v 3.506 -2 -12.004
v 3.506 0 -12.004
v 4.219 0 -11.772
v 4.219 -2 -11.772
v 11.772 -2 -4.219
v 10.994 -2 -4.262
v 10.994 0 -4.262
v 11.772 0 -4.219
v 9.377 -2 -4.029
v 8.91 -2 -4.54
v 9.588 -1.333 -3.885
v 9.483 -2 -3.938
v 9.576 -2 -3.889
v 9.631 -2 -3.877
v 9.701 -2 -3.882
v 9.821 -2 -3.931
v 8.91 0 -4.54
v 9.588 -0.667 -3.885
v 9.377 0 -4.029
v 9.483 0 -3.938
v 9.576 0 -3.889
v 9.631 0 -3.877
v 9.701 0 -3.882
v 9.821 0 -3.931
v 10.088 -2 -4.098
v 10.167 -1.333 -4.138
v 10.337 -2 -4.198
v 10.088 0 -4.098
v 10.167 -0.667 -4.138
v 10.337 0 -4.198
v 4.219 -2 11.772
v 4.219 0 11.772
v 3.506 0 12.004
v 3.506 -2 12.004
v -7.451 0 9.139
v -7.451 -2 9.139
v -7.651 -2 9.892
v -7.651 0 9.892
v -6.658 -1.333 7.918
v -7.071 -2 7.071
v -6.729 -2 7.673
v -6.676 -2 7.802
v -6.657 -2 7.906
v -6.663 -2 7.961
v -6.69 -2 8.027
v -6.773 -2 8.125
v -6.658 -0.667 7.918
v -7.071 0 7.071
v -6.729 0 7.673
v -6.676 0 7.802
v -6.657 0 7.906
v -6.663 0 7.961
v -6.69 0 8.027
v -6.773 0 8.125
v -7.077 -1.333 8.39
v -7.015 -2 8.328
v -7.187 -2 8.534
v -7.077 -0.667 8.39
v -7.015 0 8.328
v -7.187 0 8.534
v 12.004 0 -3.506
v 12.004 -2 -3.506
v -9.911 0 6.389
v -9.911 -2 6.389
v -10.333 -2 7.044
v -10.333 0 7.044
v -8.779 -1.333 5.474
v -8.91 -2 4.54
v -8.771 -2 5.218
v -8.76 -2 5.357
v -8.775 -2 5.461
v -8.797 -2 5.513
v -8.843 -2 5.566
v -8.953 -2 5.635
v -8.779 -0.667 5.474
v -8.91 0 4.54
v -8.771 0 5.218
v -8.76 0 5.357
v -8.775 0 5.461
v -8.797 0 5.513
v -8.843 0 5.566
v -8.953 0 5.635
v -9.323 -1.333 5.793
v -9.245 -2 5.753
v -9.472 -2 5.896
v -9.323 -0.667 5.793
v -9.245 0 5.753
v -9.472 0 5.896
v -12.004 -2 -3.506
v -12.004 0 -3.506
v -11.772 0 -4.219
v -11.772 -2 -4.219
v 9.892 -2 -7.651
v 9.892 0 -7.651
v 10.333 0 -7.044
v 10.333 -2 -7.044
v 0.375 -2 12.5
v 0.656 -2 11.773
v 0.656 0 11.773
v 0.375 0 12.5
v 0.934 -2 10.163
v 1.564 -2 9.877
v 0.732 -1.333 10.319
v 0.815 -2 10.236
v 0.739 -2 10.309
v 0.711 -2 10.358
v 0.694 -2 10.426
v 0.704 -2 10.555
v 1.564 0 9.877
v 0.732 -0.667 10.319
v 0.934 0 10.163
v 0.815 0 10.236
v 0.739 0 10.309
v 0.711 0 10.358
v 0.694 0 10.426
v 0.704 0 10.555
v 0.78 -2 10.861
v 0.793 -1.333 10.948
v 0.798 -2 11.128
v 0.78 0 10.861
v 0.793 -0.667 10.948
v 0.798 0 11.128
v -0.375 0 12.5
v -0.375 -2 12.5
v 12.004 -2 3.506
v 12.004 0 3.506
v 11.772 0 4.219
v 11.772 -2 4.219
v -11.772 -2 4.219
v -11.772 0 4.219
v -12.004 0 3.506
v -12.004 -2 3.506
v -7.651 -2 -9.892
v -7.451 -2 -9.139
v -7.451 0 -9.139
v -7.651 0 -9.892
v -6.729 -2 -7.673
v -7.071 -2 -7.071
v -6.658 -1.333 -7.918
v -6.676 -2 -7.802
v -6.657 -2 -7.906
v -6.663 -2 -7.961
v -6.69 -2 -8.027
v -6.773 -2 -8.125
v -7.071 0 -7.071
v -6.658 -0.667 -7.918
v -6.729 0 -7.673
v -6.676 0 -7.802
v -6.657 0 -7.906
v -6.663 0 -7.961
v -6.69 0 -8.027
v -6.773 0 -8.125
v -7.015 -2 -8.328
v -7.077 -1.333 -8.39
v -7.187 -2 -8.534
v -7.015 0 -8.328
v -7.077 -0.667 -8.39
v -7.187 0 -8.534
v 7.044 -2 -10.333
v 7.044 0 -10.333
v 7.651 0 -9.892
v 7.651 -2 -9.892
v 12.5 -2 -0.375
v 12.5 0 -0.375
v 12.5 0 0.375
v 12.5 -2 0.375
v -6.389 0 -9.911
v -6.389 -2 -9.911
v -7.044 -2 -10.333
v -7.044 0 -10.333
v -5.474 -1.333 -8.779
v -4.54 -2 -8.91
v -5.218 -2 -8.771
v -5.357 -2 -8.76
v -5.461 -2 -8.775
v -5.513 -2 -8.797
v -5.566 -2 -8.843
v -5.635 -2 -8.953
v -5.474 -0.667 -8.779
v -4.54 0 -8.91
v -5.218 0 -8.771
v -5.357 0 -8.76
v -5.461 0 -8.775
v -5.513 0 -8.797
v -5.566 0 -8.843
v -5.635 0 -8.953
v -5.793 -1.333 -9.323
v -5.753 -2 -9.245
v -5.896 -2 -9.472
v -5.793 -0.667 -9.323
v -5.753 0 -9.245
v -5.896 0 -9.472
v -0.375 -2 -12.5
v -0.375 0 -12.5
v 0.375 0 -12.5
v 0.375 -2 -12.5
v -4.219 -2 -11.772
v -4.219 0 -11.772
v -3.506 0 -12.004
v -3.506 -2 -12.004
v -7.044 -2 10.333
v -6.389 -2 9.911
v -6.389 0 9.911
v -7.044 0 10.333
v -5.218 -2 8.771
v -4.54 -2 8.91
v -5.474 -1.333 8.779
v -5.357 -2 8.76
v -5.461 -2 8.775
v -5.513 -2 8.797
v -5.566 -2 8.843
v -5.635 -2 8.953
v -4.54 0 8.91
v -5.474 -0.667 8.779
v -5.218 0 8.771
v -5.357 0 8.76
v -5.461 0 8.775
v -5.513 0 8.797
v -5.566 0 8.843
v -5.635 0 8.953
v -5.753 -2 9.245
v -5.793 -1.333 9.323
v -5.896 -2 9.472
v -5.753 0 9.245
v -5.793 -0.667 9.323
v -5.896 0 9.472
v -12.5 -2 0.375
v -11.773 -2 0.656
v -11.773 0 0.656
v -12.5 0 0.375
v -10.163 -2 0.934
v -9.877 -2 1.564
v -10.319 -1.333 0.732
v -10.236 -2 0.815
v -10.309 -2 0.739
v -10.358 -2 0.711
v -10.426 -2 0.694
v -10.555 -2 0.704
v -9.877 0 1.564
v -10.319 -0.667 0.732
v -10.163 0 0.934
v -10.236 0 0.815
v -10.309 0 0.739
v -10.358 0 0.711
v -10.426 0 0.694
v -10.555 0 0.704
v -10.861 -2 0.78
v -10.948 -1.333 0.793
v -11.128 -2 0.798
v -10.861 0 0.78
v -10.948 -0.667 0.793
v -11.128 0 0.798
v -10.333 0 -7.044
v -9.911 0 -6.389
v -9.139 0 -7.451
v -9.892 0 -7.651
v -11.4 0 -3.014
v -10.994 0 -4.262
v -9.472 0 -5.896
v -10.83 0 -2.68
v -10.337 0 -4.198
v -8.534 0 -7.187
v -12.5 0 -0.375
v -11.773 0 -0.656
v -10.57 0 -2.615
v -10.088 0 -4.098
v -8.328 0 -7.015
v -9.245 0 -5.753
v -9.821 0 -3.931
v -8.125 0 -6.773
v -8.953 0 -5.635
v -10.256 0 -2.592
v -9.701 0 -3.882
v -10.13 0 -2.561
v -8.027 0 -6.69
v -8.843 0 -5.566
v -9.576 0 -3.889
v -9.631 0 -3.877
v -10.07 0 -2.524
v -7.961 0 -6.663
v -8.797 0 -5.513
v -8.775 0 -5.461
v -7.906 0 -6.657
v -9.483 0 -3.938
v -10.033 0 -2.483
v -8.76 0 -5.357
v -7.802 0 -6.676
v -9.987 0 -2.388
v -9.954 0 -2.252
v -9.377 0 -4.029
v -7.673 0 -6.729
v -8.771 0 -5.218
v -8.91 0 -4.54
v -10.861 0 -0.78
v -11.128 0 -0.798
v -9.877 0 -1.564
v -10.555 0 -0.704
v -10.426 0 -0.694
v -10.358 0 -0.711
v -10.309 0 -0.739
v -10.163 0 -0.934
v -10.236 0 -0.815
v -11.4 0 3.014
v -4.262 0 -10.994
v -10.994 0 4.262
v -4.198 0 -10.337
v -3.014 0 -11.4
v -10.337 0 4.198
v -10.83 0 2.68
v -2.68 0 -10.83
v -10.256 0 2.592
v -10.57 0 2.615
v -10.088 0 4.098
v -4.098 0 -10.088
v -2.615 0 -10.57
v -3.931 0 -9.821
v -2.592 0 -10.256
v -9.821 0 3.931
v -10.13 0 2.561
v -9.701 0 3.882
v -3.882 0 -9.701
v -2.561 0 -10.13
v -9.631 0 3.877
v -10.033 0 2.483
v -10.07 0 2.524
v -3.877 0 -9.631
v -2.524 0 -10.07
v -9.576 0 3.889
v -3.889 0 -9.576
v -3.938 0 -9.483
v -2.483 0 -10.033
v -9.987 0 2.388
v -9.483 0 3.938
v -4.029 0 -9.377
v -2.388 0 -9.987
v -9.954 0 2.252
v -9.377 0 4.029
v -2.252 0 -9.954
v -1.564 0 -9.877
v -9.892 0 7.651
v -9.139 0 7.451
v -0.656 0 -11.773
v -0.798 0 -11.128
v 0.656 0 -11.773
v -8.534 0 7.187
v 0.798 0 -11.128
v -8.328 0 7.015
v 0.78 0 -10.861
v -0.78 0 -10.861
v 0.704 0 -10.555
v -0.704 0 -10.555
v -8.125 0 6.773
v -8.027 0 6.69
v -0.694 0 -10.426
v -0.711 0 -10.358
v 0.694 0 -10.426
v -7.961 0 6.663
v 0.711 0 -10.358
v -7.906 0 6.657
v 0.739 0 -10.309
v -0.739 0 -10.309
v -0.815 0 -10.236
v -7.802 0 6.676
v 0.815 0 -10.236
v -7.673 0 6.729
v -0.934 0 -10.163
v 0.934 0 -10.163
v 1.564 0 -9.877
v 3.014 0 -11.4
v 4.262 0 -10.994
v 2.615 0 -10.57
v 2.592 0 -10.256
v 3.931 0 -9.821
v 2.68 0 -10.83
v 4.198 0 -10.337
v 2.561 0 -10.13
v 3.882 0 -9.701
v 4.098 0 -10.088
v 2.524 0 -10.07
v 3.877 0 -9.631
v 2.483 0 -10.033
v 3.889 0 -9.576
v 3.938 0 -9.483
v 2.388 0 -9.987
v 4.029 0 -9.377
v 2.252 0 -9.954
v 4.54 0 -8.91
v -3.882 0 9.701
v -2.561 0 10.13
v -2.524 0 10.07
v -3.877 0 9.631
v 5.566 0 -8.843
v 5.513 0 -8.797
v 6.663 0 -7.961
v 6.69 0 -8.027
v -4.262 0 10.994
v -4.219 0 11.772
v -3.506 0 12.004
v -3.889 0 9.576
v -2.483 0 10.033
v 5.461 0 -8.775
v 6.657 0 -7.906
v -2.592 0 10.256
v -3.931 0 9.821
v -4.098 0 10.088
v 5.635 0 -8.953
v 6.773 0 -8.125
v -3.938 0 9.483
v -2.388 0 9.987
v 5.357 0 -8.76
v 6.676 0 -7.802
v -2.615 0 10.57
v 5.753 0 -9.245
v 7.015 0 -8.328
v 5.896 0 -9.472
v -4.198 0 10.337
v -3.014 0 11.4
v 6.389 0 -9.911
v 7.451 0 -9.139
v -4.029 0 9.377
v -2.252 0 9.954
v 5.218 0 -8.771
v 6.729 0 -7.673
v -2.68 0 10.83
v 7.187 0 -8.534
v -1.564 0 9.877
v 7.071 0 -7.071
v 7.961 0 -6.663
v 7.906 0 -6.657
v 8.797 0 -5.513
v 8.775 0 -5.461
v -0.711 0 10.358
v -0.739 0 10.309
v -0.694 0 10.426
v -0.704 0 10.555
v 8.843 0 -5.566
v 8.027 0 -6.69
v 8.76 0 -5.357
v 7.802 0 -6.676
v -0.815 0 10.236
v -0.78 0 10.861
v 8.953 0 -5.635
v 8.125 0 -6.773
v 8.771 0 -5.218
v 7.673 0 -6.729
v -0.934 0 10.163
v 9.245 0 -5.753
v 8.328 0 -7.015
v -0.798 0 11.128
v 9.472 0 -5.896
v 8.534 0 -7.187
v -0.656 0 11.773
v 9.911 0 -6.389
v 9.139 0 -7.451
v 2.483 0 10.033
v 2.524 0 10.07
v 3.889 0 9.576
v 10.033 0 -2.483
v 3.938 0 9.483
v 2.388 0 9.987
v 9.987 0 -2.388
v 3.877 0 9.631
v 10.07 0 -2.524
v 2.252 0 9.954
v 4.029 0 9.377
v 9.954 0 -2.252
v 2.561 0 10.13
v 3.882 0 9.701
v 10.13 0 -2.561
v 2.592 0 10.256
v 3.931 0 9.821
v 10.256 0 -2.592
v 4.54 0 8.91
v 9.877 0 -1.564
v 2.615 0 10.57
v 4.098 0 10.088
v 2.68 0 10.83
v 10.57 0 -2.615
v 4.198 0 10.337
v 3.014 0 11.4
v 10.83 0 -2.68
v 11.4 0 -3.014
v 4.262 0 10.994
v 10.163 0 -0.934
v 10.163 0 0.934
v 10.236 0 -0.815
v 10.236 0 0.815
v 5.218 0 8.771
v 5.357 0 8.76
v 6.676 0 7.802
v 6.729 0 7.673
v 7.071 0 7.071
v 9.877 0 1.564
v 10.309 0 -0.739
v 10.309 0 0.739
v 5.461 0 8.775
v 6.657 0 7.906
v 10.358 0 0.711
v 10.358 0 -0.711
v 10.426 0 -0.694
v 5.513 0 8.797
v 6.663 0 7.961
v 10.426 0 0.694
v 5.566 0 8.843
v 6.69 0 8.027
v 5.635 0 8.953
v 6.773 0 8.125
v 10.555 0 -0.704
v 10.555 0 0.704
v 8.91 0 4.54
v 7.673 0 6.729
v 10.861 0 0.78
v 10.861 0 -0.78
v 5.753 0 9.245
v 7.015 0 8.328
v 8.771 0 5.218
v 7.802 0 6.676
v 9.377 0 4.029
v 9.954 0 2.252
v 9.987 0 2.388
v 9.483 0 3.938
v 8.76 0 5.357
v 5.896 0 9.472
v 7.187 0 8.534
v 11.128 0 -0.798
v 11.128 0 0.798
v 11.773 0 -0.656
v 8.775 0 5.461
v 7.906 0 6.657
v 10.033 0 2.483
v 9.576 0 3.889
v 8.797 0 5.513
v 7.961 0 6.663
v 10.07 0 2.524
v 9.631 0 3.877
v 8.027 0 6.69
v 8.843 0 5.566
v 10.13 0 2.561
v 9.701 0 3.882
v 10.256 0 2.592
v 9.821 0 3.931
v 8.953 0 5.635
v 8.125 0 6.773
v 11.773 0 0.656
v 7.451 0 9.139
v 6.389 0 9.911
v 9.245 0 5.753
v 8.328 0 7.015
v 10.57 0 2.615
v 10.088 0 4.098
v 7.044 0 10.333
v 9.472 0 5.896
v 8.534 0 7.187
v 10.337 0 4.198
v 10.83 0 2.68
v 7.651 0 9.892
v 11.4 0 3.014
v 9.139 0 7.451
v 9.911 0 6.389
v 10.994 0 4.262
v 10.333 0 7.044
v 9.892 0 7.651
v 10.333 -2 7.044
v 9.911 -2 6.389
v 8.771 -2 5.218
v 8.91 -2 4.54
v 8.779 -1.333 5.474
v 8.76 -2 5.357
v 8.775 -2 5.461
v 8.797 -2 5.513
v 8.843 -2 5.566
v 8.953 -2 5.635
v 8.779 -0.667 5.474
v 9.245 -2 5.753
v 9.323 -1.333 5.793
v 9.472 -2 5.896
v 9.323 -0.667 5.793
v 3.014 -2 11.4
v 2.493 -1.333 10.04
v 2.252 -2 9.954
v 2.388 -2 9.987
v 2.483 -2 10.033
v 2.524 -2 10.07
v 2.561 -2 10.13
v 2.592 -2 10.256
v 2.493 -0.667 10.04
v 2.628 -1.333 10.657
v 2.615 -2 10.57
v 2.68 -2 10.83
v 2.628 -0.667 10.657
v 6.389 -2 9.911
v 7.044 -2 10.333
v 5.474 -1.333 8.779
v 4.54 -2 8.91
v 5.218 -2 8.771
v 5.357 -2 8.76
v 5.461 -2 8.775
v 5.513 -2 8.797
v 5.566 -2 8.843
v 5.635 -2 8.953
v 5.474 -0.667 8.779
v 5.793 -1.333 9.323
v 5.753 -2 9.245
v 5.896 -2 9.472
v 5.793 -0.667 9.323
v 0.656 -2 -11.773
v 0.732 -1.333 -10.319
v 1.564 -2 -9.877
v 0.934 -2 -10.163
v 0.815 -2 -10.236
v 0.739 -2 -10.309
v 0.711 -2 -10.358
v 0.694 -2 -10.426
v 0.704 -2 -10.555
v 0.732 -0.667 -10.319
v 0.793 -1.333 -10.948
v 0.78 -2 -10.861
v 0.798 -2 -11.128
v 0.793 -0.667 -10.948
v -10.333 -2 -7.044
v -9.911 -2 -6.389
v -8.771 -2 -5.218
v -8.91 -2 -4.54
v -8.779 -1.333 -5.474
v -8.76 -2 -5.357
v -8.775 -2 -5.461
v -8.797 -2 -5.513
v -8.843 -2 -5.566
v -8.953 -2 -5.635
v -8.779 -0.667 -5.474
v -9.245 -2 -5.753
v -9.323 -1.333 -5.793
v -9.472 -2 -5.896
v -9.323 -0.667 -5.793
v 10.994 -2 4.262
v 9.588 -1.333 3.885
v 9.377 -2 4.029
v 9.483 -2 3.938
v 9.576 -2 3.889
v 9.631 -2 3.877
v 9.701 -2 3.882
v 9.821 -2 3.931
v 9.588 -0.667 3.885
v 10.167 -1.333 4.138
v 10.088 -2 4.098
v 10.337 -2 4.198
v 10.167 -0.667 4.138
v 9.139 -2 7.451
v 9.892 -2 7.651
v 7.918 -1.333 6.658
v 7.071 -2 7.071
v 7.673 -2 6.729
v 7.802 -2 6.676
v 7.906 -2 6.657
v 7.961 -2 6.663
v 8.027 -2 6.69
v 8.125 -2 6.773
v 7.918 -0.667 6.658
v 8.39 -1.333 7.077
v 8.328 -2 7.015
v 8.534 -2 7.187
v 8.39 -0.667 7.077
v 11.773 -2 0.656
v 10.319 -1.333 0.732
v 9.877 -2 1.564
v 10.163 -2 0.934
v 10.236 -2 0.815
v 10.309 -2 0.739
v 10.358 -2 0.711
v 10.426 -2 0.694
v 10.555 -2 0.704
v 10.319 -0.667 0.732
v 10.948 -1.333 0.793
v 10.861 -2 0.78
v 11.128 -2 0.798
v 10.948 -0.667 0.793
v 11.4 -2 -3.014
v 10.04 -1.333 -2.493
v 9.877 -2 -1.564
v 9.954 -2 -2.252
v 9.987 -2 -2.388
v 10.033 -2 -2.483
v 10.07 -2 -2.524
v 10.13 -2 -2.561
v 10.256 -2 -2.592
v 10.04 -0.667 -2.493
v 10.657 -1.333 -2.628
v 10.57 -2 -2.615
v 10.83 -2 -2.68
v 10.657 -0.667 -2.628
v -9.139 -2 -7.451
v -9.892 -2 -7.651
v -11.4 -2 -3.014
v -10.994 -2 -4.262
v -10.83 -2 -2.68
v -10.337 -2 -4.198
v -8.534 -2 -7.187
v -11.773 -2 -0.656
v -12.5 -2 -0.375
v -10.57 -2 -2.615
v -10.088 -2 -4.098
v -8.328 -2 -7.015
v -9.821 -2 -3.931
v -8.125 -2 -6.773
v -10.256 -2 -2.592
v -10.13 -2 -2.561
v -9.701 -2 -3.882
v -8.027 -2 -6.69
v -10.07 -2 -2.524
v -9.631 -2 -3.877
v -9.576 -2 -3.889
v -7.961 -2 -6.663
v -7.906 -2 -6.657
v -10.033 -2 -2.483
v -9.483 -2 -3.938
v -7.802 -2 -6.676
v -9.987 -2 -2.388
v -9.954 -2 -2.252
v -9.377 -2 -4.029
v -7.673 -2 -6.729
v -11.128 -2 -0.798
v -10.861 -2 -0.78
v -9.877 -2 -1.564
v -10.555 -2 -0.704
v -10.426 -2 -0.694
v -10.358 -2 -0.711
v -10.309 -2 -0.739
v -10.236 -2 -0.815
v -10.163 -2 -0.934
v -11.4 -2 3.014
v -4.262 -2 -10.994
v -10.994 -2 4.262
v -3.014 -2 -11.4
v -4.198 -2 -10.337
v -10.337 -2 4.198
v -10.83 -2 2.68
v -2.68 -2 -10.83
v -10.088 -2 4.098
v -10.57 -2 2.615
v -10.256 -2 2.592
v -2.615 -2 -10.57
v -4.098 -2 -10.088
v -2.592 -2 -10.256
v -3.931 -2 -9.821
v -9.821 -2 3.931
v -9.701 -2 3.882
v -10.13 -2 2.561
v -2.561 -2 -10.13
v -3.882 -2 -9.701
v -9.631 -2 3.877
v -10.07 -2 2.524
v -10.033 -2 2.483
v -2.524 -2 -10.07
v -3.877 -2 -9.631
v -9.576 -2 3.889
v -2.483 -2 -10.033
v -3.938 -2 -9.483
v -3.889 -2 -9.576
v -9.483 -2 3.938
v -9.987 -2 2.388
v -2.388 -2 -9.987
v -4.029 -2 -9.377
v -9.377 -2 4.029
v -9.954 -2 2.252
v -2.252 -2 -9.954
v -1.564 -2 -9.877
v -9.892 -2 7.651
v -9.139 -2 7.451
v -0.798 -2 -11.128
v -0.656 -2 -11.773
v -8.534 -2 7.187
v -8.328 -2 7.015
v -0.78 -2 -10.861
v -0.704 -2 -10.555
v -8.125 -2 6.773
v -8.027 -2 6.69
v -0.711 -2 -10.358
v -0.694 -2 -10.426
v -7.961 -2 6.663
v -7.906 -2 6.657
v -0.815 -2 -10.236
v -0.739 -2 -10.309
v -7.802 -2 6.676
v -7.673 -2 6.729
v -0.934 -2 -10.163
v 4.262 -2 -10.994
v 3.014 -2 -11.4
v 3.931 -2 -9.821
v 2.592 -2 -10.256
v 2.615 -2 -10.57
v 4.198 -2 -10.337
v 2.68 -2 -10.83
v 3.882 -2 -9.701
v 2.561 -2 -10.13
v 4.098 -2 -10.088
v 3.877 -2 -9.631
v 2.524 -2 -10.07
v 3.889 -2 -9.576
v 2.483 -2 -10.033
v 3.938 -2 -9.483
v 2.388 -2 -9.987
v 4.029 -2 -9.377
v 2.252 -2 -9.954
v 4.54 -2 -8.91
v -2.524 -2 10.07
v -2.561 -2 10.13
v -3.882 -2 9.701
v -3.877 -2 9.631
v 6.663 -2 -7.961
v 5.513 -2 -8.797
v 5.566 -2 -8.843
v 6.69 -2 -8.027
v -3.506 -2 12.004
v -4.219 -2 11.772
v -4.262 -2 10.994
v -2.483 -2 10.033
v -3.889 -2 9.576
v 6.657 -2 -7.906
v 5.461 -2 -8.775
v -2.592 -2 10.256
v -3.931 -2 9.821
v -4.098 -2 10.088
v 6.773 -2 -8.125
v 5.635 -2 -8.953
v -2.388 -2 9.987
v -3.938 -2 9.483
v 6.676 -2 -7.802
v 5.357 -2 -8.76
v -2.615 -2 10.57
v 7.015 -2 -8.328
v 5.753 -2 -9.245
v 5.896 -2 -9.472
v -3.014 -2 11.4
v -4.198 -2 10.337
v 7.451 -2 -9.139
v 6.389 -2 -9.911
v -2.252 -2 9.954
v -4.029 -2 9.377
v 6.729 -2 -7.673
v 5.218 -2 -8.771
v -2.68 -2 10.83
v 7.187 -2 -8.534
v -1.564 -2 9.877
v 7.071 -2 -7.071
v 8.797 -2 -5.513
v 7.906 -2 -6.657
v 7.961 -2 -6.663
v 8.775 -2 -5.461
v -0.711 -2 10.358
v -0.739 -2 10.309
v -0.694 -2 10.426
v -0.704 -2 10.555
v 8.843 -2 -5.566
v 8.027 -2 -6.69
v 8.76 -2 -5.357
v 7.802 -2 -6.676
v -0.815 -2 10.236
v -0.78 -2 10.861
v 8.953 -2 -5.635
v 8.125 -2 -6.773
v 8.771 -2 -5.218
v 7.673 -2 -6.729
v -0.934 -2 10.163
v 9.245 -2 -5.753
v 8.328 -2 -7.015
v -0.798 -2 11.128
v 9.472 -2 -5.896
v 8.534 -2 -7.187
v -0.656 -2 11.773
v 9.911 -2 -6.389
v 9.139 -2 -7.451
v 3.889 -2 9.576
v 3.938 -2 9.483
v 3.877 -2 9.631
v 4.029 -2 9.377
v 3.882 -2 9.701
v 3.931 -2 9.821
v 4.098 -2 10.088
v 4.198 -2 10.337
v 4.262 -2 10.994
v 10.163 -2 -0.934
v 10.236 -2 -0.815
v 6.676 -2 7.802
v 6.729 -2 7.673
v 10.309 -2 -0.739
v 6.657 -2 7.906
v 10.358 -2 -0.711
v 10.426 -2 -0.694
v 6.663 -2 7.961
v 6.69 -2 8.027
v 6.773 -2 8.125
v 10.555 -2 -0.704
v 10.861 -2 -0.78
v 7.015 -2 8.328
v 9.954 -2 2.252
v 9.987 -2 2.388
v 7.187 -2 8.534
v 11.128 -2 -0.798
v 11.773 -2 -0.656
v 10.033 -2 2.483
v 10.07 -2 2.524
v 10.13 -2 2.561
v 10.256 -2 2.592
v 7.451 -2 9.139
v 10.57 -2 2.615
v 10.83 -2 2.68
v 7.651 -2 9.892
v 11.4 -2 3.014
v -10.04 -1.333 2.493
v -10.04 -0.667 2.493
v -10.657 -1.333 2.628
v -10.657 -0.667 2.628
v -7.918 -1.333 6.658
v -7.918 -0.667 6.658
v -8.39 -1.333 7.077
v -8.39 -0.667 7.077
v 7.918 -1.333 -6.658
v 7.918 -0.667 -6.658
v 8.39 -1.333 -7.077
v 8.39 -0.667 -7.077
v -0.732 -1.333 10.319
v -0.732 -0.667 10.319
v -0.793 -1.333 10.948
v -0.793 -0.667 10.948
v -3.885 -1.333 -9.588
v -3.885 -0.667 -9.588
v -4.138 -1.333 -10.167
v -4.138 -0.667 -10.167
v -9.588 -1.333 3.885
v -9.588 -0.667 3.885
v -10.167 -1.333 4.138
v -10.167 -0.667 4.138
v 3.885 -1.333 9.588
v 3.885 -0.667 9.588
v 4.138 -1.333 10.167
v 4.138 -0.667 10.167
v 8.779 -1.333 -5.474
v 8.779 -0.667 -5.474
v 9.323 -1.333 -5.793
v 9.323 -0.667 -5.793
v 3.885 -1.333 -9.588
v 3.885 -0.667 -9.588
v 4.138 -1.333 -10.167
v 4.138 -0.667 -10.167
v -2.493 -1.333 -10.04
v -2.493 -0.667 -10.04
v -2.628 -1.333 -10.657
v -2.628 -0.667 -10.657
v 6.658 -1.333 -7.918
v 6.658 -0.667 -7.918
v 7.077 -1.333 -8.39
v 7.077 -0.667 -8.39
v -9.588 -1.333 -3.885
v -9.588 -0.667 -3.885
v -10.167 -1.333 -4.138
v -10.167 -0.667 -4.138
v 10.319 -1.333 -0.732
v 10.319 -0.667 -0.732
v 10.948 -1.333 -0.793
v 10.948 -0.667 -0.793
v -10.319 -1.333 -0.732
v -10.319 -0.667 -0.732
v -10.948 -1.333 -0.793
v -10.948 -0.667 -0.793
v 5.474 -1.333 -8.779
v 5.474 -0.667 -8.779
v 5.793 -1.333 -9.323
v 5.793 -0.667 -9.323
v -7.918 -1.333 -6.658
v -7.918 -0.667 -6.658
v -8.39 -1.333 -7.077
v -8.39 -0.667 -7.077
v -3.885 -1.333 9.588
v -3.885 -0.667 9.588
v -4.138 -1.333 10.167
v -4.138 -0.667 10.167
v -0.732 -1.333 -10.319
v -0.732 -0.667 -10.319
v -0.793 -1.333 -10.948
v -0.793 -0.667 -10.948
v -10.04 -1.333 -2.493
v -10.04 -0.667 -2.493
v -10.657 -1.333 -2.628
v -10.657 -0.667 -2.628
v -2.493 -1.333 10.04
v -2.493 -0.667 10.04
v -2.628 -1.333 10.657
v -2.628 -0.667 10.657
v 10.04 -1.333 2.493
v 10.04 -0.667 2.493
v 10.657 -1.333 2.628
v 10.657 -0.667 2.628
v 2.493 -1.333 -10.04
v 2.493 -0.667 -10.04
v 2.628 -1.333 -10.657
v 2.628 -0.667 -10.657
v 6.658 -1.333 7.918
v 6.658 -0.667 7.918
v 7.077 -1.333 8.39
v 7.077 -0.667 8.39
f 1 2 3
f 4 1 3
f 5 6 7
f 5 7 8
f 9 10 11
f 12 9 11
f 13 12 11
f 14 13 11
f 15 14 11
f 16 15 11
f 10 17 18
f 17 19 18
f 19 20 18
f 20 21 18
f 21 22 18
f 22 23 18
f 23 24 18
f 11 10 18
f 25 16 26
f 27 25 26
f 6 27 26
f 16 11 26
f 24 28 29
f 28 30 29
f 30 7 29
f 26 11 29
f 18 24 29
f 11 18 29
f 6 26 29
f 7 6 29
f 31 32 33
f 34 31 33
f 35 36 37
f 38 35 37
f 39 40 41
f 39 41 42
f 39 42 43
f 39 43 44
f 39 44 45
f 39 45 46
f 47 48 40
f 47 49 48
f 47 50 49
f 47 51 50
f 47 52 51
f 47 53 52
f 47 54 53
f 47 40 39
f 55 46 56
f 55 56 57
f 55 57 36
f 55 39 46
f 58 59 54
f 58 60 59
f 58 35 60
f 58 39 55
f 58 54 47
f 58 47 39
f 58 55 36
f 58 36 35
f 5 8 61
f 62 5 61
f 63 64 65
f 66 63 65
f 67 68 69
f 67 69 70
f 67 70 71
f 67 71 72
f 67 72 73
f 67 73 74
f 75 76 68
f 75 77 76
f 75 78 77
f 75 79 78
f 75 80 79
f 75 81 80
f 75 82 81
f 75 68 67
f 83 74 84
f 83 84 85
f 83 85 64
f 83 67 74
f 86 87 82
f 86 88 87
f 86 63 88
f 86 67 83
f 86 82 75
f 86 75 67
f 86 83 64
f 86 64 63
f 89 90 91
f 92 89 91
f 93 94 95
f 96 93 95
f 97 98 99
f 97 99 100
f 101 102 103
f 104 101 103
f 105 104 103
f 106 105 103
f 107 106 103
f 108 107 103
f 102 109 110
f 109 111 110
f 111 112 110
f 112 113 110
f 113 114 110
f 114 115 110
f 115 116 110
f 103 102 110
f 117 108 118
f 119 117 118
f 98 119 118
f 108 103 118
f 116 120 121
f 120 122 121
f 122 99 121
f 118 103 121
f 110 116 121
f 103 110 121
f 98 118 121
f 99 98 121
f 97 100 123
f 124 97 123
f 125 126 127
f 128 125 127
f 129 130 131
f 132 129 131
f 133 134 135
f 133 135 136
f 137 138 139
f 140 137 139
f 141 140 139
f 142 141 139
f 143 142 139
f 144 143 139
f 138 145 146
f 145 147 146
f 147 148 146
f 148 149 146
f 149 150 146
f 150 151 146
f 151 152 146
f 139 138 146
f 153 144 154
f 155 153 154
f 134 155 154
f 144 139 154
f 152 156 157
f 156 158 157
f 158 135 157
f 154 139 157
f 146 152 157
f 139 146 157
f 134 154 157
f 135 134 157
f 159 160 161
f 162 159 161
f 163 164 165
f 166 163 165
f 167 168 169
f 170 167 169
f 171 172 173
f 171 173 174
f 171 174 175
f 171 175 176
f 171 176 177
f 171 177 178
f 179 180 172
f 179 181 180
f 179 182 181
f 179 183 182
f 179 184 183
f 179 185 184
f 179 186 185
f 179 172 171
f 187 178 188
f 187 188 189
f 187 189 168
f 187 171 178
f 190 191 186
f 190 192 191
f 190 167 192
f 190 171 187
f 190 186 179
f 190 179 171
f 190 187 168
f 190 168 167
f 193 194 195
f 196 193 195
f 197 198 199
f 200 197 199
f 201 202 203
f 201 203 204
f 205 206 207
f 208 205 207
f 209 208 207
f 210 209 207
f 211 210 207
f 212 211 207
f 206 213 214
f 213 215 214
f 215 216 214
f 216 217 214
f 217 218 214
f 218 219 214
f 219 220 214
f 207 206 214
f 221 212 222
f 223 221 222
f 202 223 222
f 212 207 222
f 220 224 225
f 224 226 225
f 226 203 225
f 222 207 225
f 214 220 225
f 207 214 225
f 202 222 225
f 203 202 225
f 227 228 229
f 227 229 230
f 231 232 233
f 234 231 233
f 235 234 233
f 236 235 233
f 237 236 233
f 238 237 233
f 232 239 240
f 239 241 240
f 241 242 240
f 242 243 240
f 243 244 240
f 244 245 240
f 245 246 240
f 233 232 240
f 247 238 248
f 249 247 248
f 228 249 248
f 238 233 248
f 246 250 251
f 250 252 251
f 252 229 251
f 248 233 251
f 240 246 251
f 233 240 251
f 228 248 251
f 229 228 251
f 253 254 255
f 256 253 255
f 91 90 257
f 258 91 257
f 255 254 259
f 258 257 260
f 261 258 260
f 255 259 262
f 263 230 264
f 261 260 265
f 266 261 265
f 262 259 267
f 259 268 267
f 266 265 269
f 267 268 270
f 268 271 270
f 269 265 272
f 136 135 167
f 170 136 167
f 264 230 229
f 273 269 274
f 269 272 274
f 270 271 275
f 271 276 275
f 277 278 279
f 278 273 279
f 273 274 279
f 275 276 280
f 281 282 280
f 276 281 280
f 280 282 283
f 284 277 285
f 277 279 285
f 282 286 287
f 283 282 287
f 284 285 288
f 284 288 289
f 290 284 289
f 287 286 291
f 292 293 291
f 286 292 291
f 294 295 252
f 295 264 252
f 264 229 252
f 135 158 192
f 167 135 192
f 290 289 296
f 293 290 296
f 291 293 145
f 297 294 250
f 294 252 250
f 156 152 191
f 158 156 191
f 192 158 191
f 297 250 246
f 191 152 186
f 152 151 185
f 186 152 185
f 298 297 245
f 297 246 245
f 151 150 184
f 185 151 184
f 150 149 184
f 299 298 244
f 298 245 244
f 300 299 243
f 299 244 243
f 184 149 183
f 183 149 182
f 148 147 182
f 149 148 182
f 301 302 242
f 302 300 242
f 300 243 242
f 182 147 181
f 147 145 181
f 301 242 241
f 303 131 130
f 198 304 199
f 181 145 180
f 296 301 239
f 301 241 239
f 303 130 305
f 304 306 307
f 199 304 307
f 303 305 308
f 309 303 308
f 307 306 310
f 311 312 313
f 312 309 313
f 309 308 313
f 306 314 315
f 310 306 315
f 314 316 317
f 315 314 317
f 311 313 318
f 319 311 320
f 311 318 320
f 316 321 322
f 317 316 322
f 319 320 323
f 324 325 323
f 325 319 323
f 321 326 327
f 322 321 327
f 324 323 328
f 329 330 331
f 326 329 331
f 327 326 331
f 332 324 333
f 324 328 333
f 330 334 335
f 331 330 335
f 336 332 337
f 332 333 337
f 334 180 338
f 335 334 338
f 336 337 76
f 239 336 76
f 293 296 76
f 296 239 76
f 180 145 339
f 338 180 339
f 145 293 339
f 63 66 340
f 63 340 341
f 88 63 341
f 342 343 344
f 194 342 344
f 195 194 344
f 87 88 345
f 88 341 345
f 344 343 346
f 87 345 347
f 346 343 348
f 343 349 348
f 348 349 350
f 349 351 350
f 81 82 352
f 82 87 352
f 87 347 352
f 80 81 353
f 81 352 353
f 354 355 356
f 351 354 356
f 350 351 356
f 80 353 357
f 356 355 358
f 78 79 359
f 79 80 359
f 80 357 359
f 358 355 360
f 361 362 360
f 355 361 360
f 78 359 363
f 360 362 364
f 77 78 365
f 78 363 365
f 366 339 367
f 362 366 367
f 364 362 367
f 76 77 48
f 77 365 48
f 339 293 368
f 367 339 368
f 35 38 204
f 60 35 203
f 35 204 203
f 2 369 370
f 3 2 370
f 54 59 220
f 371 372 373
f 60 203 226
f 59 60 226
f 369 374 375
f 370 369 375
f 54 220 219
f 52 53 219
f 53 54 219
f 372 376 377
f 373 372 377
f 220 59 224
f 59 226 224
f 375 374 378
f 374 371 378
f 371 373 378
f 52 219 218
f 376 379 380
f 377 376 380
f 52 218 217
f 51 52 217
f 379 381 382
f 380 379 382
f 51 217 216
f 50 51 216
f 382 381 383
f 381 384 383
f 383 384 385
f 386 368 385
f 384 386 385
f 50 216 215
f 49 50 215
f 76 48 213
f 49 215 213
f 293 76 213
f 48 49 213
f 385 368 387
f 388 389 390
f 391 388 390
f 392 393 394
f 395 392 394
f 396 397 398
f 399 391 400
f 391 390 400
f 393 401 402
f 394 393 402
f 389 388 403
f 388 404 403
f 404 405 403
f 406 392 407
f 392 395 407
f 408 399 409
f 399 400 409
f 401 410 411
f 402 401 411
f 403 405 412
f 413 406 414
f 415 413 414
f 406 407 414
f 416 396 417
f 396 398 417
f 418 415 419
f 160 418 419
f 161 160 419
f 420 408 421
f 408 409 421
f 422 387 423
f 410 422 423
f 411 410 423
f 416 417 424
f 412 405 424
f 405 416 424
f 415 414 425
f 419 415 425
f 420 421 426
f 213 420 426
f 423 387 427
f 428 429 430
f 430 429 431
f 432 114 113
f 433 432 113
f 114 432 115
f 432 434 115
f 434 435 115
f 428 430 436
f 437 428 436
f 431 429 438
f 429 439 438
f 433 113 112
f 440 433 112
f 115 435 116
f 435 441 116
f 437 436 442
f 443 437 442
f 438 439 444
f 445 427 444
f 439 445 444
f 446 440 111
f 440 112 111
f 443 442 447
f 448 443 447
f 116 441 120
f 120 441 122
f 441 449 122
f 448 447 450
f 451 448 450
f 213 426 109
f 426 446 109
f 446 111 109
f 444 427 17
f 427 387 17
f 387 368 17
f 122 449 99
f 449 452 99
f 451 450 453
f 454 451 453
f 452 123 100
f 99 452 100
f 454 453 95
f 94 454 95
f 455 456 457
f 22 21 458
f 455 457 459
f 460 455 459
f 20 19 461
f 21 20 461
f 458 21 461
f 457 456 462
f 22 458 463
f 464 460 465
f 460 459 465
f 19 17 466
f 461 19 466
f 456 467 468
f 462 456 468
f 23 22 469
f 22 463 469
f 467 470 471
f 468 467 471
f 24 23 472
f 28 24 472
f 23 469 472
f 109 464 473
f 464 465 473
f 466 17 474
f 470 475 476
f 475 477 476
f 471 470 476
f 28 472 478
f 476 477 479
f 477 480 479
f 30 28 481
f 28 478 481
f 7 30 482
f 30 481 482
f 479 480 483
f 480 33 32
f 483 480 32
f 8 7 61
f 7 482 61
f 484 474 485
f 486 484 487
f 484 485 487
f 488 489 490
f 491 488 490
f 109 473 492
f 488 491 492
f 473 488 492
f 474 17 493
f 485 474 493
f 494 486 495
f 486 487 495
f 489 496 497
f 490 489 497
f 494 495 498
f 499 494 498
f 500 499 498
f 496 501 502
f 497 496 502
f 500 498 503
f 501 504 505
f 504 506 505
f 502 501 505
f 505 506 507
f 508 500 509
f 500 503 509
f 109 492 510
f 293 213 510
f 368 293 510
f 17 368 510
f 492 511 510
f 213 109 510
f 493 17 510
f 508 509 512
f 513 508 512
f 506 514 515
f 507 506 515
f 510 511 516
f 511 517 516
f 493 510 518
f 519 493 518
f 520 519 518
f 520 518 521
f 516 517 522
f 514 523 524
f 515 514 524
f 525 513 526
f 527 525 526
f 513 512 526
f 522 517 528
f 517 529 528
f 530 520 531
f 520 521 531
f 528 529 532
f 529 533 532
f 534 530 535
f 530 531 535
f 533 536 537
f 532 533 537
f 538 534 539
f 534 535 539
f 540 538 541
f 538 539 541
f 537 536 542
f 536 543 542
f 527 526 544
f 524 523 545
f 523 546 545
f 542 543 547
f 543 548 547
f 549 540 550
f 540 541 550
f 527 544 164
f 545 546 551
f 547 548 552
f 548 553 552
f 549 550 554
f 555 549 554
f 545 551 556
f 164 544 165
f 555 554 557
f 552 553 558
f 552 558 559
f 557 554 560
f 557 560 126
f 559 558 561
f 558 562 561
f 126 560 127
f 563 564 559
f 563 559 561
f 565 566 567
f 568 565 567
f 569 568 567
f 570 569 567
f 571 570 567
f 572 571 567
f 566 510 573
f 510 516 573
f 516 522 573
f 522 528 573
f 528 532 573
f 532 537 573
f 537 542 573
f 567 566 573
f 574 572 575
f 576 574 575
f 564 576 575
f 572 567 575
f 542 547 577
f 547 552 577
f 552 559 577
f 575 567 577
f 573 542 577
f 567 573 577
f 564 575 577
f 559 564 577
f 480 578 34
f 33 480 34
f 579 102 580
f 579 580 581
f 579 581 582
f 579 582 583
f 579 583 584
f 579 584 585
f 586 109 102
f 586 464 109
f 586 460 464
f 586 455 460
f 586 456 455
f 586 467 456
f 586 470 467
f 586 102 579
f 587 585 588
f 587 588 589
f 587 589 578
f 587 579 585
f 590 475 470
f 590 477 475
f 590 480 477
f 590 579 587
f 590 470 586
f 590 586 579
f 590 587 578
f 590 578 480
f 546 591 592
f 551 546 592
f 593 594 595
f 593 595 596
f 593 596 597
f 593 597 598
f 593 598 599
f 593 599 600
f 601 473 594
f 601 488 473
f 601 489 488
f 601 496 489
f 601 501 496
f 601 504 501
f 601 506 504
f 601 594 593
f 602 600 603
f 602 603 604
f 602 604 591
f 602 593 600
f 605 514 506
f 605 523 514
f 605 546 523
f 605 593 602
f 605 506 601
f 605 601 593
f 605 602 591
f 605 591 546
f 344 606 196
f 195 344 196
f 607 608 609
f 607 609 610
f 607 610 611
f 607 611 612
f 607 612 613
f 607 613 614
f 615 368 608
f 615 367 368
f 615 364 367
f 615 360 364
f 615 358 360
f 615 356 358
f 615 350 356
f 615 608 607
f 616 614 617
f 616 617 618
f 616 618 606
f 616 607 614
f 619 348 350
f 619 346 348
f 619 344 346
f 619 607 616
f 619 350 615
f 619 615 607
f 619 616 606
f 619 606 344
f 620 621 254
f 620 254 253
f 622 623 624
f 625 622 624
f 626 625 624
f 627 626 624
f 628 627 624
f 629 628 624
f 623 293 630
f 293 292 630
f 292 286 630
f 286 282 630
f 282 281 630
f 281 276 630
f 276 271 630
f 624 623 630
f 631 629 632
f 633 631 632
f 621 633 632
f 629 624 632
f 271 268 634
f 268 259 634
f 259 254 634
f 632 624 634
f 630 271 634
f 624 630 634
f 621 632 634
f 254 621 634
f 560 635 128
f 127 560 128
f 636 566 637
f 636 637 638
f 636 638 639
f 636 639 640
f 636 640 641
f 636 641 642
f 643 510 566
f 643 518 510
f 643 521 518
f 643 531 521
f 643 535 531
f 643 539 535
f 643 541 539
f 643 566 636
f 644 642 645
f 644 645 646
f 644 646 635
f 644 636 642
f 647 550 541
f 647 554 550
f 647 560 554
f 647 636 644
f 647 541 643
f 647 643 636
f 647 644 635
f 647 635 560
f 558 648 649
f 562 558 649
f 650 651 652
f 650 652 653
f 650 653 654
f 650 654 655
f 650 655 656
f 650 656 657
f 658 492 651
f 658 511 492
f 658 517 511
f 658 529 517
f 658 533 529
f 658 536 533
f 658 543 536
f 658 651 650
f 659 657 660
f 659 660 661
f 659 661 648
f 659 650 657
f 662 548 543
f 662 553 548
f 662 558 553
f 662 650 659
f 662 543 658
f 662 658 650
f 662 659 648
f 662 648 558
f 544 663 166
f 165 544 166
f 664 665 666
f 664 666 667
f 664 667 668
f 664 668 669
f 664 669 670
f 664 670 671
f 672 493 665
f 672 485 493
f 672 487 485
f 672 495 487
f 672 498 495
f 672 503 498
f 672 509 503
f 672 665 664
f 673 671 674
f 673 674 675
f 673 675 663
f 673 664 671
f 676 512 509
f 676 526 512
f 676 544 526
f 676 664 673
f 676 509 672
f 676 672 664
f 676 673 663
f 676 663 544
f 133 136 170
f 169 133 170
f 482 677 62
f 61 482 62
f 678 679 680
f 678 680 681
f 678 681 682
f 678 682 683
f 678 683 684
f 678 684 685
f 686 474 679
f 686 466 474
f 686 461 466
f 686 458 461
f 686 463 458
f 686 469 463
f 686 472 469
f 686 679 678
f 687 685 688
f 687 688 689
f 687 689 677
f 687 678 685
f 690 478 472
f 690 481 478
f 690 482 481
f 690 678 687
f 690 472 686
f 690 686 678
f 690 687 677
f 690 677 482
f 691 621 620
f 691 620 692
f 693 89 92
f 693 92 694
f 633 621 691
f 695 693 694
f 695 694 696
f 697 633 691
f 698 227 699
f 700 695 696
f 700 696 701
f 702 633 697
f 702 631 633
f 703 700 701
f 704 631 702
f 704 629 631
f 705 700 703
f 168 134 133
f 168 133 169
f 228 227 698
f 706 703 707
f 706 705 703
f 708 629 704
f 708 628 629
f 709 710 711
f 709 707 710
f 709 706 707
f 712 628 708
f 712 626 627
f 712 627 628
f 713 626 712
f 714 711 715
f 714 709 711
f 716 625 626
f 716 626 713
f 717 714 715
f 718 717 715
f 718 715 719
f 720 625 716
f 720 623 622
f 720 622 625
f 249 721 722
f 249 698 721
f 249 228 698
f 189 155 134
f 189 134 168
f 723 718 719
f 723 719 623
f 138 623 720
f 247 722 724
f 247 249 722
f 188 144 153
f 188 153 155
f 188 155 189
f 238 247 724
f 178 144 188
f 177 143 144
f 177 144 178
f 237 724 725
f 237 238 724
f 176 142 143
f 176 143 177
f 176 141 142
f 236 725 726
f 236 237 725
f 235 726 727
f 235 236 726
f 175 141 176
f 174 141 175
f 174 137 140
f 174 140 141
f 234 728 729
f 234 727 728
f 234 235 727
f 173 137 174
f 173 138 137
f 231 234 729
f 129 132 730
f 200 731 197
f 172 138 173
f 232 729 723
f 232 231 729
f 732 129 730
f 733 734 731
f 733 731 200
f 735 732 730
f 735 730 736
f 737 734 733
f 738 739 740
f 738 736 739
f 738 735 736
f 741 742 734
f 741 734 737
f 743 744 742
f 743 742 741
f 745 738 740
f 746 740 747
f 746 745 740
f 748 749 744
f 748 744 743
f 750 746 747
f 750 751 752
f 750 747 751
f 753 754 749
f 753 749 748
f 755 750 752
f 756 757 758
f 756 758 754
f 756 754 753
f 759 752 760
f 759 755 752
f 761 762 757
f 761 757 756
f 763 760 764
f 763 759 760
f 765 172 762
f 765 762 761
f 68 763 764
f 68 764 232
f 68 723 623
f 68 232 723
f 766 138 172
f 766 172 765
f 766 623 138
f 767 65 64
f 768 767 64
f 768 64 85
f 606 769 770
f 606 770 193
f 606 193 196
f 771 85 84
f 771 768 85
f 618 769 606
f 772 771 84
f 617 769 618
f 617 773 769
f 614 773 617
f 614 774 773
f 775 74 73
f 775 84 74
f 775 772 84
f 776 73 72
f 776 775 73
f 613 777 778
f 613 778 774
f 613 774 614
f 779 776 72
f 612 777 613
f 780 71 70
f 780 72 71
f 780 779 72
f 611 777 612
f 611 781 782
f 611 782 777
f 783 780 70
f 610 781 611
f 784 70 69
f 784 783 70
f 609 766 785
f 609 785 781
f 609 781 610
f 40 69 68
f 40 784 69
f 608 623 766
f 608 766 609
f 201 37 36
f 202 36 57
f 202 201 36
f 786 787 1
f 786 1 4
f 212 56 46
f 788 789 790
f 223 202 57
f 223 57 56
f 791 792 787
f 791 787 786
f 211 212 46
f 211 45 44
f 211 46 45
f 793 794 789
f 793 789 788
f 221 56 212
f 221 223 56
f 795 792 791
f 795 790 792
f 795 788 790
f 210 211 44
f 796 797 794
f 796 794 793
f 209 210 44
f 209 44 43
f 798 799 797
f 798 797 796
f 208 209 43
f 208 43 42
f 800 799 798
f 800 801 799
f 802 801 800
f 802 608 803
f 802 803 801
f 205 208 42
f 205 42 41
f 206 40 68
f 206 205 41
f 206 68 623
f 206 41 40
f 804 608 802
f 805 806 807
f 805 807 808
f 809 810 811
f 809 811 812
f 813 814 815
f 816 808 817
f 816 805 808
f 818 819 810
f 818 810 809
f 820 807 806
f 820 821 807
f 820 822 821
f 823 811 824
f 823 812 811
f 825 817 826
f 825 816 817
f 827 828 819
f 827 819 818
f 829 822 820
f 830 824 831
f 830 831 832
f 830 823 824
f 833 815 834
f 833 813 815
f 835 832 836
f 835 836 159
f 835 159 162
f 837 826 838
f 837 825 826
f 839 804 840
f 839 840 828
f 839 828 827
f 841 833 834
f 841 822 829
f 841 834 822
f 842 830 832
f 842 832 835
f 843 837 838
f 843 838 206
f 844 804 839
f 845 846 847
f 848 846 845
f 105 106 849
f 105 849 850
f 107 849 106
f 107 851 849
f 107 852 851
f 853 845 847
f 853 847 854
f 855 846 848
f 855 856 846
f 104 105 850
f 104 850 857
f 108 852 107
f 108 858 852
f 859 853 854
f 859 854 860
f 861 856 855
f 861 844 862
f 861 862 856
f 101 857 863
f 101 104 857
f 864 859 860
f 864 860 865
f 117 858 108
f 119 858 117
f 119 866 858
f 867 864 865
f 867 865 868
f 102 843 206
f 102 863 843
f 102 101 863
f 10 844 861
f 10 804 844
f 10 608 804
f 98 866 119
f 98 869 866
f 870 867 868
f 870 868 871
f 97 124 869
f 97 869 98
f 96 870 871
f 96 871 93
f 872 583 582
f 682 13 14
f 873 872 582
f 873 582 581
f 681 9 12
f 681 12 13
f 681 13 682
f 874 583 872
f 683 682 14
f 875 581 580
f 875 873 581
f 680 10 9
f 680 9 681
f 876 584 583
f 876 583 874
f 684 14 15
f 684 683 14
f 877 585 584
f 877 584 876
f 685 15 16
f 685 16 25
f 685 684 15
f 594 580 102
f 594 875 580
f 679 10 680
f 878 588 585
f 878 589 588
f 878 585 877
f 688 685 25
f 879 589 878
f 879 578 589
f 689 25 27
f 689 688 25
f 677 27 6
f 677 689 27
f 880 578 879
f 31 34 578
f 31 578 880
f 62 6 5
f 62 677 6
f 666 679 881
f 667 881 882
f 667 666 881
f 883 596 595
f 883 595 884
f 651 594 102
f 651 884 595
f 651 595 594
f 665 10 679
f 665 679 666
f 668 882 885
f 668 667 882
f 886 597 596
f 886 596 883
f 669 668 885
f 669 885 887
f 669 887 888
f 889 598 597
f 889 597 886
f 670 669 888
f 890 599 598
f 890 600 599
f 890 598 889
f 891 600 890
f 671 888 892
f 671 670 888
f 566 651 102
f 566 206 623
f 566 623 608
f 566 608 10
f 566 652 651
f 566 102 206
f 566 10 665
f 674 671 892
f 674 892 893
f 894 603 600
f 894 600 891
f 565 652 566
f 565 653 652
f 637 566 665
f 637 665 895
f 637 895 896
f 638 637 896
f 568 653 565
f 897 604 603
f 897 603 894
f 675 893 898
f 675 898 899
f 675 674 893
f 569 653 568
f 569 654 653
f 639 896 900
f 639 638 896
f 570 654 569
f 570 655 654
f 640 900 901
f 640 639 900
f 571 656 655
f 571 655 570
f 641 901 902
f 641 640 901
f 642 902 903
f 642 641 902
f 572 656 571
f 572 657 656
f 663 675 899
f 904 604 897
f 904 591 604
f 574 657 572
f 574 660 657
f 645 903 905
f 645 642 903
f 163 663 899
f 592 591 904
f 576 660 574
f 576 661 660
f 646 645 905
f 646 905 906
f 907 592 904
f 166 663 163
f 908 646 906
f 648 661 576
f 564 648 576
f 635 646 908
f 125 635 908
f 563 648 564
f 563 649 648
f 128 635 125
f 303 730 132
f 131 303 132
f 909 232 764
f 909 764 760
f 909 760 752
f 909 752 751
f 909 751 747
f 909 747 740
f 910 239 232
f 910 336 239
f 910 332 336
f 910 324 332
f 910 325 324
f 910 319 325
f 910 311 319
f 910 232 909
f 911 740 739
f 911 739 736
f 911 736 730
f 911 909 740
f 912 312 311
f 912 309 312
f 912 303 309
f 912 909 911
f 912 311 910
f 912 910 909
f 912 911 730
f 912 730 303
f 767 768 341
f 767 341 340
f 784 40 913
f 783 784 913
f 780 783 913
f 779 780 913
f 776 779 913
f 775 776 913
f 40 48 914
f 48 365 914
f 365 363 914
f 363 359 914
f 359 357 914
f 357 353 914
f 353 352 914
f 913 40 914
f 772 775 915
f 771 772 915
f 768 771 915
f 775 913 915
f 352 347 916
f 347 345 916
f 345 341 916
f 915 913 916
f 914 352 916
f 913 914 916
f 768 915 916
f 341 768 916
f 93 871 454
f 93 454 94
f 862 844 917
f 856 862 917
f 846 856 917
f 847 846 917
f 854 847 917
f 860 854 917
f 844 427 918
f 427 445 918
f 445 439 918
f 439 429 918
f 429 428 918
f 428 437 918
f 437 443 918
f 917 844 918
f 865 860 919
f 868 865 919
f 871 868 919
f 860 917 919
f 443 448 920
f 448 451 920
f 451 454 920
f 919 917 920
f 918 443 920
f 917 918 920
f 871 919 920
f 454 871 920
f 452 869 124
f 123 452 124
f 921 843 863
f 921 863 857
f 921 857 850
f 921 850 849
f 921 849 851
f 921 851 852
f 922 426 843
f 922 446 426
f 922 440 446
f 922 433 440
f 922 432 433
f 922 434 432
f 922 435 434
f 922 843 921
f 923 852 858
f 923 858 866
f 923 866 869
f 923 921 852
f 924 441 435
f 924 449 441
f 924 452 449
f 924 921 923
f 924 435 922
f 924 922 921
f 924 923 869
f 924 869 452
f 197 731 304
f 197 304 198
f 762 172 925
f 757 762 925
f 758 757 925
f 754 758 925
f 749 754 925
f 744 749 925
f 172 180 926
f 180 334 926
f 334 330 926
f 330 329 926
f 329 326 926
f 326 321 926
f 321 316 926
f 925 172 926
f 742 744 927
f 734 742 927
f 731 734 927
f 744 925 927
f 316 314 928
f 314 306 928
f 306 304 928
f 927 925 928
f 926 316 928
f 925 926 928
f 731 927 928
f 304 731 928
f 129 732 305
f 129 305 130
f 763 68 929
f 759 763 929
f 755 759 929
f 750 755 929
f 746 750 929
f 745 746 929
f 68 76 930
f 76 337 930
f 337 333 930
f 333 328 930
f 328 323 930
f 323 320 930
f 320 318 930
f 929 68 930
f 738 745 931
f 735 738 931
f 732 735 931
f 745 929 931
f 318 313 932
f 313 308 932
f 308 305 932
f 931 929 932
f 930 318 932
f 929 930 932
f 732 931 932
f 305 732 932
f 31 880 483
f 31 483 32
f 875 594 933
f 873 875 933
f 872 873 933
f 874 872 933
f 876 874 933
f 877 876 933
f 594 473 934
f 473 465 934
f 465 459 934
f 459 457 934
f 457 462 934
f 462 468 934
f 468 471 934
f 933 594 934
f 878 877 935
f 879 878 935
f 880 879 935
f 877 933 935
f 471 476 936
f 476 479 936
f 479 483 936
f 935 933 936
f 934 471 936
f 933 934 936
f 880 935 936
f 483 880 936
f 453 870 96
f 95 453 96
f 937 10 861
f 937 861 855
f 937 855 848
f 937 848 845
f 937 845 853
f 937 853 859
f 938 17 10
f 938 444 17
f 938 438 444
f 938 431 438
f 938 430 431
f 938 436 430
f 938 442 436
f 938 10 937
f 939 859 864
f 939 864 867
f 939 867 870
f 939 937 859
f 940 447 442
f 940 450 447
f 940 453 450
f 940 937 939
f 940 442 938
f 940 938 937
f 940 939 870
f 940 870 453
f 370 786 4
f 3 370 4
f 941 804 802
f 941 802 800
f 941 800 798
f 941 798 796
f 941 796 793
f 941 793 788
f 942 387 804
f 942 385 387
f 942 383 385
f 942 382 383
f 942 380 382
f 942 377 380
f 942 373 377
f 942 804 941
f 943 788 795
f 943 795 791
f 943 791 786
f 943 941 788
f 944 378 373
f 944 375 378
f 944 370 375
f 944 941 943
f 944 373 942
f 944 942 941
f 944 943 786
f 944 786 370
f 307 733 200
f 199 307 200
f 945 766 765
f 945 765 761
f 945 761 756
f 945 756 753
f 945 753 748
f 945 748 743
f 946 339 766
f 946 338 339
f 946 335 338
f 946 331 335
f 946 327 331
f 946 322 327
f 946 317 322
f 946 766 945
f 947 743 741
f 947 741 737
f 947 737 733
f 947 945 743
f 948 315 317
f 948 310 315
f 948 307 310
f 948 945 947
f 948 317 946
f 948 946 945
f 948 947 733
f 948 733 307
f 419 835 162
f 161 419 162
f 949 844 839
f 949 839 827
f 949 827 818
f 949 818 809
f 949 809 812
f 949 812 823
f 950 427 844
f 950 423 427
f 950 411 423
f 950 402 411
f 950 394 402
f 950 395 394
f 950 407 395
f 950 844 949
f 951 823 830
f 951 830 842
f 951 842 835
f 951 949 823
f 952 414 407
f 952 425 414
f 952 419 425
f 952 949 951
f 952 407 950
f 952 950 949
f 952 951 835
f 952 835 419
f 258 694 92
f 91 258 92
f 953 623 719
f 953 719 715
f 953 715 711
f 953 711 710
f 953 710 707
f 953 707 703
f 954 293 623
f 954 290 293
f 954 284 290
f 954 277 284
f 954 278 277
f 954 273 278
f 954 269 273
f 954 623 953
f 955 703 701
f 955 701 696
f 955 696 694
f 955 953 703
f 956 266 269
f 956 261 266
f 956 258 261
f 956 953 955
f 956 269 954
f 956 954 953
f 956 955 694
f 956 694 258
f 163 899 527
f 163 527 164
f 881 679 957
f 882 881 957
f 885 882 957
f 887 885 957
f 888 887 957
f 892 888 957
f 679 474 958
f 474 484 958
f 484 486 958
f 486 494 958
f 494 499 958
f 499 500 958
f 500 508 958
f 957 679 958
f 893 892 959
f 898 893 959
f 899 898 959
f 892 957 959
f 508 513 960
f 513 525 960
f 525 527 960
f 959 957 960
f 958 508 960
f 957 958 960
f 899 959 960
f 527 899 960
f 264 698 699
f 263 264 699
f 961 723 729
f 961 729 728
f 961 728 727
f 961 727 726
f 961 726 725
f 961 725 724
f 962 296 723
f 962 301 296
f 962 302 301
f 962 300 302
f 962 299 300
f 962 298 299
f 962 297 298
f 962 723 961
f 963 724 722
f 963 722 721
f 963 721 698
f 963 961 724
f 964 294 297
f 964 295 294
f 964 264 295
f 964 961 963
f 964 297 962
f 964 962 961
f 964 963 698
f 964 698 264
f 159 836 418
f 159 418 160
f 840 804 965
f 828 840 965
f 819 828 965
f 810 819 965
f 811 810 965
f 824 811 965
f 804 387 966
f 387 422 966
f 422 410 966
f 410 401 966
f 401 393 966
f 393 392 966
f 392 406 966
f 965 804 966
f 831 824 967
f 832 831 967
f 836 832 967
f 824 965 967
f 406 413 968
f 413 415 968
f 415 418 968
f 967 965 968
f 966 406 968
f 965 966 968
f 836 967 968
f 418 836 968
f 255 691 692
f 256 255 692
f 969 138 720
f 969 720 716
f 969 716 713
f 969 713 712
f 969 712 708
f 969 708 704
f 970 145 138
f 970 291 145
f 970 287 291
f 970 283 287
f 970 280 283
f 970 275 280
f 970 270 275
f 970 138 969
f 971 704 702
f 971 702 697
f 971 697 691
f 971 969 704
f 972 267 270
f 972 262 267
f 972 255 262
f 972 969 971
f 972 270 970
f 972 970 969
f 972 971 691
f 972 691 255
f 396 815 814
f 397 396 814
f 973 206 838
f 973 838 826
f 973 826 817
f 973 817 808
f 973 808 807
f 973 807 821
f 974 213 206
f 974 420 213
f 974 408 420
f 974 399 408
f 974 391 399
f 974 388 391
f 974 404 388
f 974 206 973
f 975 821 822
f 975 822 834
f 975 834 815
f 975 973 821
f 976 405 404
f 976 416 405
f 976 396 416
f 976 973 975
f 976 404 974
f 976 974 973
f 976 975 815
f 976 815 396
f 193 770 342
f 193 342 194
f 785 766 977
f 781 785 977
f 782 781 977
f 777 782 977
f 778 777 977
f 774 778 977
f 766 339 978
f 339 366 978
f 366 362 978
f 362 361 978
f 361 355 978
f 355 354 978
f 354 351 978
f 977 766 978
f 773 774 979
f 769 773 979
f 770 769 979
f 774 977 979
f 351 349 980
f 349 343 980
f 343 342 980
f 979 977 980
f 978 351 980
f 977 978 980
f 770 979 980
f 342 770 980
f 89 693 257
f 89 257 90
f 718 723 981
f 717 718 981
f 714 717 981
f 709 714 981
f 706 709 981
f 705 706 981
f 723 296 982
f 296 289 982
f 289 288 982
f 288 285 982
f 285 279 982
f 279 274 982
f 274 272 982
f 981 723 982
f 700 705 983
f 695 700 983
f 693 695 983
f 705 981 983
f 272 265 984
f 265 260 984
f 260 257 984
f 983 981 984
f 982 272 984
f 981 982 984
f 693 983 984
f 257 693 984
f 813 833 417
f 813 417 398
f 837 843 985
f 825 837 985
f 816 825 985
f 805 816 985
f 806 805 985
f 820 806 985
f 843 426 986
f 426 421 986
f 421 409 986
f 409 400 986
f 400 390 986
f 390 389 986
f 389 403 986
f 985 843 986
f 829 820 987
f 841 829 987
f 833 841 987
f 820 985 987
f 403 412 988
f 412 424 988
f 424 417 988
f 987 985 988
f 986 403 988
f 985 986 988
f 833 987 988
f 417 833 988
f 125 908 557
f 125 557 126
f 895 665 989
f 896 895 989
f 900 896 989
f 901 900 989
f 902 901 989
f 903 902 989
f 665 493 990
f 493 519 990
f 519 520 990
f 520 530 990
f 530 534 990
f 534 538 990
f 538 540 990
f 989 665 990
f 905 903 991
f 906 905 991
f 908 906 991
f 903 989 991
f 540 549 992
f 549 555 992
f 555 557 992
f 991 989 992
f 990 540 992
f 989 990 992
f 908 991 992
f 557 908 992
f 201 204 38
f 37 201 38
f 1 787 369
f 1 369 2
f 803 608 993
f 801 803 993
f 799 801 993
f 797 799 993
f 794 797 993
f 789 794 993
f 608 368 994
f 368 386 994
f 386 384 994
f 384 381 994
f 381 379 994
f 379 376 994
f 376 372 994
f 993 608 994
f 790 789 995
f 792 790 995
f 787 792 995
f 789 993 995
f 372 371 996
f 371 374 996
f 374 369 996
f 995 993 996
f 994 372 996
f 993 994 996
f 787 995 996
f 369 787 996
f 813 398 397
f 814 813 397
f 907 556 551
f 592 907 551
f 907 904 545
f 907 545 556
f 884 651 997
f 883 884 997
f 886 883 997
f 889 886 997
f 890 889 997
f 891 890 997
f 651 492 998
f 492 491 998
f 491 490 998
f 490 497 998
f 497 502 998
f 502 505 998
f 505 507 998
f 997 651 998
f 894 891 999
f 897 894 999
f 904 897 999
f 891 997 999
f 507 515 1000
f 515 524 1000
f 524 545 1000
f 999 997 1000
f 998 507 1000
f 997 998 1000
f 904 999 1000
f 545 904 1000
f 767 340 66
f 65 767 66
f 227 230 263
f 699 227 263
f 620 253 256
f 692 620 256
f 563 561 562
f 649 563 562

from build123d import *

# Parameters (mm, degrees)
F0_R     = 10
F1_DEPTH = 2
F3_DEPTH = 2
F5_COUNT = 20


with BuildPart() as f1:
    # F0 (on Front) → F1 (new body)
    with BuildSketch(Plane.XZ):
        Circle(F0_R)
    extrude(amount=F1_DEPTH)



with BuildPart() as f3:
    # F2 (on Front) → F3 (new body)
    with BuildSketch(Plane.XZ):
        with BuildLine():
            ThreePointArc((1.5643446504, -9.876883406), (0, -10), (-1.5643446504, -9.876883406))
            add(Edge.make_bspline(
                [(-1.5643446504, -9.876883406), (-1.3482088209, -10.0179007419), (-0.4598869792, -10.2192351032), (-0.982159307, -11.0197913813), (-0.6143502542, -11.9196688756), (-0.375, -12.5)],
                knots=[0, 0, 0, 0, 0.3201040428, 0.582006504, 1, 1, 1, 1], degree=3))
            Line((-0.375, -12.5), (0.375, -12.5))
            add(Edge.make_bspline(
                [(1.5643446504, -9.876883406), (1.3482088209, -10.0179007419), (0.4598869792, -10.2192351032), (0.982159307, -11.0197913813), (0.6143502542, -11.9196688756), (0.375, -12.5)],
                knots=[0, 0, 0, 0, 0.3201040428, 0.582006504, 1, 1, 1, 1], degree=3))
        make_face()
    extrude(amount=F3_DEPTH)


with BuildPart() as f1_1:
    add(f1.part)

    add(f3.part)  # F5 merges F3
    # F5: F3 ×20 about axis
    f5_axis = Axis((0, -5.7404395193, 0), (0, -1, 0))
    for i in range(1, F5_COUNT):
        add(f3.part.rotate(f5_axis, i * 360 / F5_COUNT))


solid = f1_1.part
